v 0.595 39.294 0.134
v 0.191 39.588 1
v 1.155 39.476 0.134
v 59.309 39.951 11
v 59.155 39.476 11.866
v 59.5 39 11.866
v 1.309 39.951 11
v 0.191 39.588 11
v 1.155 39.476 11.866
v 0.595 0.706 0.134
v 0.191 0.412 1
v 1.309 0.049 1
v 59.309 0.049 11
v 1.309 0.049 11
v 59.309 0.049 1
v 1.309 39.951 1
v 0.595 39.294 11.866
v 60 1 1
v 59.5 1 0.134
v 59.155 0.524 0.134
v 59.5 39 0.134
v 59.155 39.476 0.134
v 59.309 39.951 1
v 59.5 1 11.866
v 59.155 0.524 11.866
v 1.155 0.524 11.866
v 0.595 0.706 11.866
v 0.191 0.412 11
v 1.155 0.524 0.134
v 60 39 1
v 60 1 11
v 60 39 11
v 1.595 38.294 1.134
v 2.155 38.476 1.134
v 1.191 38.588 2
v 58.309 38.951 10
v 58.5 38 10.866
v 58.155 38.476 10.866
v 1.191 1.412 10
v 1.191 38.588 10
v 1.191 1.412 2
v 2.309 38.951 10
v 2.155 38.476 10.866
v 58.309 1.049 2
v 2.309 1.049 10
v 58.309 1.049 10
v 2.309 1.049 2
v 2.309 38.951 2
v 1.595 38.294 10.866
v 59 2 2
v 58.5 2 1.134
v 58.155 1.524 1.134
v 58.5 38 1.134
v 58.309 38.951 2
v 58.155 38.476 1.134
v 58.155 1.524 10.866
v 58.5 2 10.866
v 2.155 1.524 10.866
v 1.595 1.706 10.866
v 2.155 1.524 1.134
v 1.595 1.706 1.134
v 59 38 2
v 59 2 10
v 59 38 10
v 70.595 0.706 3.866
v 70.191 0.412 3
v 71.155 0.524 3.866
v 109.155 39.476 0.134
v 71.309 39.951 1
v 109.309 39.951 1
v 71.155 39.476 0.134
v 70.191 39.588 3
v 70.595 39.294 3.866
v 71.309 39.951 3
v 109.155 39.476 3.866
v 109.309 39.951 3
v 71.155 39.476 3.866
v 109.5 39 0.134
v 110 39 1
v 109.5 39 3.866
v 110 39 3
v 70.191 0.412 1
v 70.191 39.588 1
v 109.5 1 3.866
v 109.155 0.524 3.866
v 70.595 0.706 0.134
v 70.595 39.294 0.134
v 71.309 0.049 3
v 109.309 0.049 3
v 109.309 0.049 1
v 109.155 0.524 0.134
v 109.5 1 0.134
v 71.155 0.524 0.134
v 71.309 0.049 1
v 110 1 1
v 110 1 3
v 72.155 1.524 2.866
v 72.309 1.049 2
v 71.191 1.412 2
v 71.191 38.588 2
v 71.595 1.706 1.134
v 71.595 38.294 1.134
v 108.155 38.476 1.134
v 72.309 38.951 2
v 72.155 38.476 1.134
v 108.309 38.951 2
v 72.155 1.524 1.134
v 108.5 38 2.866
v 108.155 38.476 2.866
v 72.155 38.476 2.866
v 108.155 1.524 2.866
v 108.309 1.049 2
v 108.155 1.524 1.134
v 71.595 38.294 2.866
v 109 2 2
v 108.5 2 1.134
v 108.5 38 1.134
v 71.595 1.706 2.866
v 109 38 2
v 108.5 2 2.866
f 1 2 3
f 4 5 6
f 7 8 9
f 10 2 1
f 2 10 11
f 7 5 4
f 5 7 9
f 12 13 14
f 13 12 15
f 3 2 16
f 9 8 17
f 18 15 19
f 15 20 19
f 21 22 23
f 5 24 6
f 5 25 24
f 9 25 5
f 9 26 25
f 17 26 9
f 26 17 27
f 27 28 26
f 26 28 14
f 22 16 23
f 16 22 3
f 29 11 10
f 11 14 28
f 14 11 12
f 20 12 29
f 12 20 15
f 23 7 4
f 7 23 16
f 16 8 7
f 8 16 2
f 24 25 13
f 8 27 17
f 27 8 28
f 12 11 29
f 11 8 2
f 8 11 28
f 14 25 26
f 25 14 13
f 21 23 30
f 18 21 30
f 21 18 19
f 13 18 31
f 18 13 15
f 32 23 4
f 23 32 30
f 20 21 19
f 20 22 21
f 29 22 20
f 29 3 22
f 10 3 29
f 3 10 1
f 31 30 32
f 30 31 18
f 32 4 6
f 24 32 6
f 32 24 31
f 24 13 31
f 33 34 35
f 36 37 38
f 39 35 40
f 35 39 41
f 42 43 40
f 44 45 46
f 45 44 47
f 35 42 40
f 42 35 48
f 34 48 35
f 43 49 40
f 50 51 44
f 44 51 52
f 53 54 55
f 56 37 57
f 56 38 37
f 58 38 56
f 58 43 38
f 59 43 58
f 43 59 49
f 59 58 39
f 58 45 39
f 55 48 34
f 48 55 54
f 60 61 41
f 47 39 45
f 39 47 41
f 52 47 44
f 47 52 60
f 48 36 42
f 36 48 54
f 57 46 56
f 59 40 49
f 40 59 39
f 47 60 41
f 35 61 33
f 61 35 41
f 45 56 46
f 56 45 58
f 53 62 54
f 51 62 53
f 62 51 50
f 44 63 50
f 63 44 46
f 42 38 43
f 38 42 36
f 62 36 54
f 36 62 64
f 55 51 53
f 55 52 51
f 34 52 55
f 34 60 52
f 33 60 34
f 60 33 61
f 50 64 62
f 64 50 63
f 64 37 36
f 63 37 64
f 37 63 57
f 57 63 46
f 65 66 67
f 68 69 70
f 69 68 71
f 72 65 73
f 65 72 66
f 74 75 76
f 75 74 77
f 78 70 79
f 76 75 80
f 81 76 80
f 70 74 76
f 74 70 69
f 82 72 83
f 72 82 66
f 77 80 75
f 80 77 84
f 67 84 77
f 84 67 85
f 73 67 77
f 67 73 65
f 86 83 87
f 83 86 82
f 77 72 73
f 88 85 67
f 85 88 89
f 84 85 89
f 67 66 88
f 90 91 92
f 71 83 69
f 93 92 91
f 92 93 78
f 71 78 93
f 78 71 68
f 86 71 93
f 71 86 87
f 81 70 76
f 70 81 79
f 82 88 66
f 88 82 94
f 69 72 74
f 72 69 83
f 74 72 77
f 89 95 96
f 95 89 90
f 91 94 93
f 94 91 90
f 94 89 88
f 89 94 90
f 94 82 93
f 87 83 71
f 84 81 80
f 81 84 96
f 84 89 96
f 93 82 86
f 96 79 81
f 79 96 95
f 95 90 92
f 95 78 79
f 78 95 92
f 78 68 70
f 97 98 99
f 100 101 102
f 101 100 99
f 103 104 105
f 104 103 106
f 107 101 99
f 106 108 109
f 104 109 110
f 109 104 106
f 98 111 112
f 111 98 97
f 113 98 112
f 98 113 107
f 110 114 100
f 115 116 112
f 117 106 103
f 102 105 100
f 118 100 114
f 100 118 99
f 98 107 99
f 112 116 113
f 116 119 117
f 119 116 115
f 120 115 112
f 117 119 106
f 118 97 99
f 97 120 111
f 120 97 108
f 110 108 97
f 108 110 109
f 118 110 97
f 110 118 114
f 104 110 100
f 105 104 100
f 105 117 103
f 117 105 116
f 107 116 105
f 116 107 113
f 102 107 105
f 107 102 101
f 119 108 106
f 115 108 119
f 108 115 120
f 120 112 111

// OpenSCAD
module roundedBox(height, width, length, wall_thickness, corner_radius, remove_bottom) {
    difference() {
        // Outer shape
        hull() {
            for (x = [0, length - corner_radius * 2])
                for (y = [0, width - corner_radius * 2])
                    for (z = [0, height - corner_radius * 2])
                        translate([x + corner_radius, y + corner_radius, z + corner_radius])
                            sphere(corner_radius);
        }

        // Inner shape (offset by wall thickness)
        translate([wall_thickness, wall_thickness, wall_thickness])
        hull() {
            for (x = [0, length - wall_thickness * 2 - corner_radius * 2])
                for (y = [0, width - wall_thickness * 2 - corner_radius * 2])
                    for (z = [0, height - wall_thickness * 2 - corner_radius * 2])
                        translate([x + corner_radius, y + corner_radius, z + corner_radius])
                            sphere(corner_radius);
        }

        // Remove bottom if required
        if (remove_bottom) {
            translate([-1, -1, -1])
            cube([length + 2, width + 2, wall_thickness]);
        }
    }
}

// First box without bottom
roundedBox(12, 40, 60, 1, 1, true);

translate([70, 0, 0]) // Move the second box to avoid overlap
// Second box without bottom
roundedBox(4, 40, 40, 1, 1, true);
